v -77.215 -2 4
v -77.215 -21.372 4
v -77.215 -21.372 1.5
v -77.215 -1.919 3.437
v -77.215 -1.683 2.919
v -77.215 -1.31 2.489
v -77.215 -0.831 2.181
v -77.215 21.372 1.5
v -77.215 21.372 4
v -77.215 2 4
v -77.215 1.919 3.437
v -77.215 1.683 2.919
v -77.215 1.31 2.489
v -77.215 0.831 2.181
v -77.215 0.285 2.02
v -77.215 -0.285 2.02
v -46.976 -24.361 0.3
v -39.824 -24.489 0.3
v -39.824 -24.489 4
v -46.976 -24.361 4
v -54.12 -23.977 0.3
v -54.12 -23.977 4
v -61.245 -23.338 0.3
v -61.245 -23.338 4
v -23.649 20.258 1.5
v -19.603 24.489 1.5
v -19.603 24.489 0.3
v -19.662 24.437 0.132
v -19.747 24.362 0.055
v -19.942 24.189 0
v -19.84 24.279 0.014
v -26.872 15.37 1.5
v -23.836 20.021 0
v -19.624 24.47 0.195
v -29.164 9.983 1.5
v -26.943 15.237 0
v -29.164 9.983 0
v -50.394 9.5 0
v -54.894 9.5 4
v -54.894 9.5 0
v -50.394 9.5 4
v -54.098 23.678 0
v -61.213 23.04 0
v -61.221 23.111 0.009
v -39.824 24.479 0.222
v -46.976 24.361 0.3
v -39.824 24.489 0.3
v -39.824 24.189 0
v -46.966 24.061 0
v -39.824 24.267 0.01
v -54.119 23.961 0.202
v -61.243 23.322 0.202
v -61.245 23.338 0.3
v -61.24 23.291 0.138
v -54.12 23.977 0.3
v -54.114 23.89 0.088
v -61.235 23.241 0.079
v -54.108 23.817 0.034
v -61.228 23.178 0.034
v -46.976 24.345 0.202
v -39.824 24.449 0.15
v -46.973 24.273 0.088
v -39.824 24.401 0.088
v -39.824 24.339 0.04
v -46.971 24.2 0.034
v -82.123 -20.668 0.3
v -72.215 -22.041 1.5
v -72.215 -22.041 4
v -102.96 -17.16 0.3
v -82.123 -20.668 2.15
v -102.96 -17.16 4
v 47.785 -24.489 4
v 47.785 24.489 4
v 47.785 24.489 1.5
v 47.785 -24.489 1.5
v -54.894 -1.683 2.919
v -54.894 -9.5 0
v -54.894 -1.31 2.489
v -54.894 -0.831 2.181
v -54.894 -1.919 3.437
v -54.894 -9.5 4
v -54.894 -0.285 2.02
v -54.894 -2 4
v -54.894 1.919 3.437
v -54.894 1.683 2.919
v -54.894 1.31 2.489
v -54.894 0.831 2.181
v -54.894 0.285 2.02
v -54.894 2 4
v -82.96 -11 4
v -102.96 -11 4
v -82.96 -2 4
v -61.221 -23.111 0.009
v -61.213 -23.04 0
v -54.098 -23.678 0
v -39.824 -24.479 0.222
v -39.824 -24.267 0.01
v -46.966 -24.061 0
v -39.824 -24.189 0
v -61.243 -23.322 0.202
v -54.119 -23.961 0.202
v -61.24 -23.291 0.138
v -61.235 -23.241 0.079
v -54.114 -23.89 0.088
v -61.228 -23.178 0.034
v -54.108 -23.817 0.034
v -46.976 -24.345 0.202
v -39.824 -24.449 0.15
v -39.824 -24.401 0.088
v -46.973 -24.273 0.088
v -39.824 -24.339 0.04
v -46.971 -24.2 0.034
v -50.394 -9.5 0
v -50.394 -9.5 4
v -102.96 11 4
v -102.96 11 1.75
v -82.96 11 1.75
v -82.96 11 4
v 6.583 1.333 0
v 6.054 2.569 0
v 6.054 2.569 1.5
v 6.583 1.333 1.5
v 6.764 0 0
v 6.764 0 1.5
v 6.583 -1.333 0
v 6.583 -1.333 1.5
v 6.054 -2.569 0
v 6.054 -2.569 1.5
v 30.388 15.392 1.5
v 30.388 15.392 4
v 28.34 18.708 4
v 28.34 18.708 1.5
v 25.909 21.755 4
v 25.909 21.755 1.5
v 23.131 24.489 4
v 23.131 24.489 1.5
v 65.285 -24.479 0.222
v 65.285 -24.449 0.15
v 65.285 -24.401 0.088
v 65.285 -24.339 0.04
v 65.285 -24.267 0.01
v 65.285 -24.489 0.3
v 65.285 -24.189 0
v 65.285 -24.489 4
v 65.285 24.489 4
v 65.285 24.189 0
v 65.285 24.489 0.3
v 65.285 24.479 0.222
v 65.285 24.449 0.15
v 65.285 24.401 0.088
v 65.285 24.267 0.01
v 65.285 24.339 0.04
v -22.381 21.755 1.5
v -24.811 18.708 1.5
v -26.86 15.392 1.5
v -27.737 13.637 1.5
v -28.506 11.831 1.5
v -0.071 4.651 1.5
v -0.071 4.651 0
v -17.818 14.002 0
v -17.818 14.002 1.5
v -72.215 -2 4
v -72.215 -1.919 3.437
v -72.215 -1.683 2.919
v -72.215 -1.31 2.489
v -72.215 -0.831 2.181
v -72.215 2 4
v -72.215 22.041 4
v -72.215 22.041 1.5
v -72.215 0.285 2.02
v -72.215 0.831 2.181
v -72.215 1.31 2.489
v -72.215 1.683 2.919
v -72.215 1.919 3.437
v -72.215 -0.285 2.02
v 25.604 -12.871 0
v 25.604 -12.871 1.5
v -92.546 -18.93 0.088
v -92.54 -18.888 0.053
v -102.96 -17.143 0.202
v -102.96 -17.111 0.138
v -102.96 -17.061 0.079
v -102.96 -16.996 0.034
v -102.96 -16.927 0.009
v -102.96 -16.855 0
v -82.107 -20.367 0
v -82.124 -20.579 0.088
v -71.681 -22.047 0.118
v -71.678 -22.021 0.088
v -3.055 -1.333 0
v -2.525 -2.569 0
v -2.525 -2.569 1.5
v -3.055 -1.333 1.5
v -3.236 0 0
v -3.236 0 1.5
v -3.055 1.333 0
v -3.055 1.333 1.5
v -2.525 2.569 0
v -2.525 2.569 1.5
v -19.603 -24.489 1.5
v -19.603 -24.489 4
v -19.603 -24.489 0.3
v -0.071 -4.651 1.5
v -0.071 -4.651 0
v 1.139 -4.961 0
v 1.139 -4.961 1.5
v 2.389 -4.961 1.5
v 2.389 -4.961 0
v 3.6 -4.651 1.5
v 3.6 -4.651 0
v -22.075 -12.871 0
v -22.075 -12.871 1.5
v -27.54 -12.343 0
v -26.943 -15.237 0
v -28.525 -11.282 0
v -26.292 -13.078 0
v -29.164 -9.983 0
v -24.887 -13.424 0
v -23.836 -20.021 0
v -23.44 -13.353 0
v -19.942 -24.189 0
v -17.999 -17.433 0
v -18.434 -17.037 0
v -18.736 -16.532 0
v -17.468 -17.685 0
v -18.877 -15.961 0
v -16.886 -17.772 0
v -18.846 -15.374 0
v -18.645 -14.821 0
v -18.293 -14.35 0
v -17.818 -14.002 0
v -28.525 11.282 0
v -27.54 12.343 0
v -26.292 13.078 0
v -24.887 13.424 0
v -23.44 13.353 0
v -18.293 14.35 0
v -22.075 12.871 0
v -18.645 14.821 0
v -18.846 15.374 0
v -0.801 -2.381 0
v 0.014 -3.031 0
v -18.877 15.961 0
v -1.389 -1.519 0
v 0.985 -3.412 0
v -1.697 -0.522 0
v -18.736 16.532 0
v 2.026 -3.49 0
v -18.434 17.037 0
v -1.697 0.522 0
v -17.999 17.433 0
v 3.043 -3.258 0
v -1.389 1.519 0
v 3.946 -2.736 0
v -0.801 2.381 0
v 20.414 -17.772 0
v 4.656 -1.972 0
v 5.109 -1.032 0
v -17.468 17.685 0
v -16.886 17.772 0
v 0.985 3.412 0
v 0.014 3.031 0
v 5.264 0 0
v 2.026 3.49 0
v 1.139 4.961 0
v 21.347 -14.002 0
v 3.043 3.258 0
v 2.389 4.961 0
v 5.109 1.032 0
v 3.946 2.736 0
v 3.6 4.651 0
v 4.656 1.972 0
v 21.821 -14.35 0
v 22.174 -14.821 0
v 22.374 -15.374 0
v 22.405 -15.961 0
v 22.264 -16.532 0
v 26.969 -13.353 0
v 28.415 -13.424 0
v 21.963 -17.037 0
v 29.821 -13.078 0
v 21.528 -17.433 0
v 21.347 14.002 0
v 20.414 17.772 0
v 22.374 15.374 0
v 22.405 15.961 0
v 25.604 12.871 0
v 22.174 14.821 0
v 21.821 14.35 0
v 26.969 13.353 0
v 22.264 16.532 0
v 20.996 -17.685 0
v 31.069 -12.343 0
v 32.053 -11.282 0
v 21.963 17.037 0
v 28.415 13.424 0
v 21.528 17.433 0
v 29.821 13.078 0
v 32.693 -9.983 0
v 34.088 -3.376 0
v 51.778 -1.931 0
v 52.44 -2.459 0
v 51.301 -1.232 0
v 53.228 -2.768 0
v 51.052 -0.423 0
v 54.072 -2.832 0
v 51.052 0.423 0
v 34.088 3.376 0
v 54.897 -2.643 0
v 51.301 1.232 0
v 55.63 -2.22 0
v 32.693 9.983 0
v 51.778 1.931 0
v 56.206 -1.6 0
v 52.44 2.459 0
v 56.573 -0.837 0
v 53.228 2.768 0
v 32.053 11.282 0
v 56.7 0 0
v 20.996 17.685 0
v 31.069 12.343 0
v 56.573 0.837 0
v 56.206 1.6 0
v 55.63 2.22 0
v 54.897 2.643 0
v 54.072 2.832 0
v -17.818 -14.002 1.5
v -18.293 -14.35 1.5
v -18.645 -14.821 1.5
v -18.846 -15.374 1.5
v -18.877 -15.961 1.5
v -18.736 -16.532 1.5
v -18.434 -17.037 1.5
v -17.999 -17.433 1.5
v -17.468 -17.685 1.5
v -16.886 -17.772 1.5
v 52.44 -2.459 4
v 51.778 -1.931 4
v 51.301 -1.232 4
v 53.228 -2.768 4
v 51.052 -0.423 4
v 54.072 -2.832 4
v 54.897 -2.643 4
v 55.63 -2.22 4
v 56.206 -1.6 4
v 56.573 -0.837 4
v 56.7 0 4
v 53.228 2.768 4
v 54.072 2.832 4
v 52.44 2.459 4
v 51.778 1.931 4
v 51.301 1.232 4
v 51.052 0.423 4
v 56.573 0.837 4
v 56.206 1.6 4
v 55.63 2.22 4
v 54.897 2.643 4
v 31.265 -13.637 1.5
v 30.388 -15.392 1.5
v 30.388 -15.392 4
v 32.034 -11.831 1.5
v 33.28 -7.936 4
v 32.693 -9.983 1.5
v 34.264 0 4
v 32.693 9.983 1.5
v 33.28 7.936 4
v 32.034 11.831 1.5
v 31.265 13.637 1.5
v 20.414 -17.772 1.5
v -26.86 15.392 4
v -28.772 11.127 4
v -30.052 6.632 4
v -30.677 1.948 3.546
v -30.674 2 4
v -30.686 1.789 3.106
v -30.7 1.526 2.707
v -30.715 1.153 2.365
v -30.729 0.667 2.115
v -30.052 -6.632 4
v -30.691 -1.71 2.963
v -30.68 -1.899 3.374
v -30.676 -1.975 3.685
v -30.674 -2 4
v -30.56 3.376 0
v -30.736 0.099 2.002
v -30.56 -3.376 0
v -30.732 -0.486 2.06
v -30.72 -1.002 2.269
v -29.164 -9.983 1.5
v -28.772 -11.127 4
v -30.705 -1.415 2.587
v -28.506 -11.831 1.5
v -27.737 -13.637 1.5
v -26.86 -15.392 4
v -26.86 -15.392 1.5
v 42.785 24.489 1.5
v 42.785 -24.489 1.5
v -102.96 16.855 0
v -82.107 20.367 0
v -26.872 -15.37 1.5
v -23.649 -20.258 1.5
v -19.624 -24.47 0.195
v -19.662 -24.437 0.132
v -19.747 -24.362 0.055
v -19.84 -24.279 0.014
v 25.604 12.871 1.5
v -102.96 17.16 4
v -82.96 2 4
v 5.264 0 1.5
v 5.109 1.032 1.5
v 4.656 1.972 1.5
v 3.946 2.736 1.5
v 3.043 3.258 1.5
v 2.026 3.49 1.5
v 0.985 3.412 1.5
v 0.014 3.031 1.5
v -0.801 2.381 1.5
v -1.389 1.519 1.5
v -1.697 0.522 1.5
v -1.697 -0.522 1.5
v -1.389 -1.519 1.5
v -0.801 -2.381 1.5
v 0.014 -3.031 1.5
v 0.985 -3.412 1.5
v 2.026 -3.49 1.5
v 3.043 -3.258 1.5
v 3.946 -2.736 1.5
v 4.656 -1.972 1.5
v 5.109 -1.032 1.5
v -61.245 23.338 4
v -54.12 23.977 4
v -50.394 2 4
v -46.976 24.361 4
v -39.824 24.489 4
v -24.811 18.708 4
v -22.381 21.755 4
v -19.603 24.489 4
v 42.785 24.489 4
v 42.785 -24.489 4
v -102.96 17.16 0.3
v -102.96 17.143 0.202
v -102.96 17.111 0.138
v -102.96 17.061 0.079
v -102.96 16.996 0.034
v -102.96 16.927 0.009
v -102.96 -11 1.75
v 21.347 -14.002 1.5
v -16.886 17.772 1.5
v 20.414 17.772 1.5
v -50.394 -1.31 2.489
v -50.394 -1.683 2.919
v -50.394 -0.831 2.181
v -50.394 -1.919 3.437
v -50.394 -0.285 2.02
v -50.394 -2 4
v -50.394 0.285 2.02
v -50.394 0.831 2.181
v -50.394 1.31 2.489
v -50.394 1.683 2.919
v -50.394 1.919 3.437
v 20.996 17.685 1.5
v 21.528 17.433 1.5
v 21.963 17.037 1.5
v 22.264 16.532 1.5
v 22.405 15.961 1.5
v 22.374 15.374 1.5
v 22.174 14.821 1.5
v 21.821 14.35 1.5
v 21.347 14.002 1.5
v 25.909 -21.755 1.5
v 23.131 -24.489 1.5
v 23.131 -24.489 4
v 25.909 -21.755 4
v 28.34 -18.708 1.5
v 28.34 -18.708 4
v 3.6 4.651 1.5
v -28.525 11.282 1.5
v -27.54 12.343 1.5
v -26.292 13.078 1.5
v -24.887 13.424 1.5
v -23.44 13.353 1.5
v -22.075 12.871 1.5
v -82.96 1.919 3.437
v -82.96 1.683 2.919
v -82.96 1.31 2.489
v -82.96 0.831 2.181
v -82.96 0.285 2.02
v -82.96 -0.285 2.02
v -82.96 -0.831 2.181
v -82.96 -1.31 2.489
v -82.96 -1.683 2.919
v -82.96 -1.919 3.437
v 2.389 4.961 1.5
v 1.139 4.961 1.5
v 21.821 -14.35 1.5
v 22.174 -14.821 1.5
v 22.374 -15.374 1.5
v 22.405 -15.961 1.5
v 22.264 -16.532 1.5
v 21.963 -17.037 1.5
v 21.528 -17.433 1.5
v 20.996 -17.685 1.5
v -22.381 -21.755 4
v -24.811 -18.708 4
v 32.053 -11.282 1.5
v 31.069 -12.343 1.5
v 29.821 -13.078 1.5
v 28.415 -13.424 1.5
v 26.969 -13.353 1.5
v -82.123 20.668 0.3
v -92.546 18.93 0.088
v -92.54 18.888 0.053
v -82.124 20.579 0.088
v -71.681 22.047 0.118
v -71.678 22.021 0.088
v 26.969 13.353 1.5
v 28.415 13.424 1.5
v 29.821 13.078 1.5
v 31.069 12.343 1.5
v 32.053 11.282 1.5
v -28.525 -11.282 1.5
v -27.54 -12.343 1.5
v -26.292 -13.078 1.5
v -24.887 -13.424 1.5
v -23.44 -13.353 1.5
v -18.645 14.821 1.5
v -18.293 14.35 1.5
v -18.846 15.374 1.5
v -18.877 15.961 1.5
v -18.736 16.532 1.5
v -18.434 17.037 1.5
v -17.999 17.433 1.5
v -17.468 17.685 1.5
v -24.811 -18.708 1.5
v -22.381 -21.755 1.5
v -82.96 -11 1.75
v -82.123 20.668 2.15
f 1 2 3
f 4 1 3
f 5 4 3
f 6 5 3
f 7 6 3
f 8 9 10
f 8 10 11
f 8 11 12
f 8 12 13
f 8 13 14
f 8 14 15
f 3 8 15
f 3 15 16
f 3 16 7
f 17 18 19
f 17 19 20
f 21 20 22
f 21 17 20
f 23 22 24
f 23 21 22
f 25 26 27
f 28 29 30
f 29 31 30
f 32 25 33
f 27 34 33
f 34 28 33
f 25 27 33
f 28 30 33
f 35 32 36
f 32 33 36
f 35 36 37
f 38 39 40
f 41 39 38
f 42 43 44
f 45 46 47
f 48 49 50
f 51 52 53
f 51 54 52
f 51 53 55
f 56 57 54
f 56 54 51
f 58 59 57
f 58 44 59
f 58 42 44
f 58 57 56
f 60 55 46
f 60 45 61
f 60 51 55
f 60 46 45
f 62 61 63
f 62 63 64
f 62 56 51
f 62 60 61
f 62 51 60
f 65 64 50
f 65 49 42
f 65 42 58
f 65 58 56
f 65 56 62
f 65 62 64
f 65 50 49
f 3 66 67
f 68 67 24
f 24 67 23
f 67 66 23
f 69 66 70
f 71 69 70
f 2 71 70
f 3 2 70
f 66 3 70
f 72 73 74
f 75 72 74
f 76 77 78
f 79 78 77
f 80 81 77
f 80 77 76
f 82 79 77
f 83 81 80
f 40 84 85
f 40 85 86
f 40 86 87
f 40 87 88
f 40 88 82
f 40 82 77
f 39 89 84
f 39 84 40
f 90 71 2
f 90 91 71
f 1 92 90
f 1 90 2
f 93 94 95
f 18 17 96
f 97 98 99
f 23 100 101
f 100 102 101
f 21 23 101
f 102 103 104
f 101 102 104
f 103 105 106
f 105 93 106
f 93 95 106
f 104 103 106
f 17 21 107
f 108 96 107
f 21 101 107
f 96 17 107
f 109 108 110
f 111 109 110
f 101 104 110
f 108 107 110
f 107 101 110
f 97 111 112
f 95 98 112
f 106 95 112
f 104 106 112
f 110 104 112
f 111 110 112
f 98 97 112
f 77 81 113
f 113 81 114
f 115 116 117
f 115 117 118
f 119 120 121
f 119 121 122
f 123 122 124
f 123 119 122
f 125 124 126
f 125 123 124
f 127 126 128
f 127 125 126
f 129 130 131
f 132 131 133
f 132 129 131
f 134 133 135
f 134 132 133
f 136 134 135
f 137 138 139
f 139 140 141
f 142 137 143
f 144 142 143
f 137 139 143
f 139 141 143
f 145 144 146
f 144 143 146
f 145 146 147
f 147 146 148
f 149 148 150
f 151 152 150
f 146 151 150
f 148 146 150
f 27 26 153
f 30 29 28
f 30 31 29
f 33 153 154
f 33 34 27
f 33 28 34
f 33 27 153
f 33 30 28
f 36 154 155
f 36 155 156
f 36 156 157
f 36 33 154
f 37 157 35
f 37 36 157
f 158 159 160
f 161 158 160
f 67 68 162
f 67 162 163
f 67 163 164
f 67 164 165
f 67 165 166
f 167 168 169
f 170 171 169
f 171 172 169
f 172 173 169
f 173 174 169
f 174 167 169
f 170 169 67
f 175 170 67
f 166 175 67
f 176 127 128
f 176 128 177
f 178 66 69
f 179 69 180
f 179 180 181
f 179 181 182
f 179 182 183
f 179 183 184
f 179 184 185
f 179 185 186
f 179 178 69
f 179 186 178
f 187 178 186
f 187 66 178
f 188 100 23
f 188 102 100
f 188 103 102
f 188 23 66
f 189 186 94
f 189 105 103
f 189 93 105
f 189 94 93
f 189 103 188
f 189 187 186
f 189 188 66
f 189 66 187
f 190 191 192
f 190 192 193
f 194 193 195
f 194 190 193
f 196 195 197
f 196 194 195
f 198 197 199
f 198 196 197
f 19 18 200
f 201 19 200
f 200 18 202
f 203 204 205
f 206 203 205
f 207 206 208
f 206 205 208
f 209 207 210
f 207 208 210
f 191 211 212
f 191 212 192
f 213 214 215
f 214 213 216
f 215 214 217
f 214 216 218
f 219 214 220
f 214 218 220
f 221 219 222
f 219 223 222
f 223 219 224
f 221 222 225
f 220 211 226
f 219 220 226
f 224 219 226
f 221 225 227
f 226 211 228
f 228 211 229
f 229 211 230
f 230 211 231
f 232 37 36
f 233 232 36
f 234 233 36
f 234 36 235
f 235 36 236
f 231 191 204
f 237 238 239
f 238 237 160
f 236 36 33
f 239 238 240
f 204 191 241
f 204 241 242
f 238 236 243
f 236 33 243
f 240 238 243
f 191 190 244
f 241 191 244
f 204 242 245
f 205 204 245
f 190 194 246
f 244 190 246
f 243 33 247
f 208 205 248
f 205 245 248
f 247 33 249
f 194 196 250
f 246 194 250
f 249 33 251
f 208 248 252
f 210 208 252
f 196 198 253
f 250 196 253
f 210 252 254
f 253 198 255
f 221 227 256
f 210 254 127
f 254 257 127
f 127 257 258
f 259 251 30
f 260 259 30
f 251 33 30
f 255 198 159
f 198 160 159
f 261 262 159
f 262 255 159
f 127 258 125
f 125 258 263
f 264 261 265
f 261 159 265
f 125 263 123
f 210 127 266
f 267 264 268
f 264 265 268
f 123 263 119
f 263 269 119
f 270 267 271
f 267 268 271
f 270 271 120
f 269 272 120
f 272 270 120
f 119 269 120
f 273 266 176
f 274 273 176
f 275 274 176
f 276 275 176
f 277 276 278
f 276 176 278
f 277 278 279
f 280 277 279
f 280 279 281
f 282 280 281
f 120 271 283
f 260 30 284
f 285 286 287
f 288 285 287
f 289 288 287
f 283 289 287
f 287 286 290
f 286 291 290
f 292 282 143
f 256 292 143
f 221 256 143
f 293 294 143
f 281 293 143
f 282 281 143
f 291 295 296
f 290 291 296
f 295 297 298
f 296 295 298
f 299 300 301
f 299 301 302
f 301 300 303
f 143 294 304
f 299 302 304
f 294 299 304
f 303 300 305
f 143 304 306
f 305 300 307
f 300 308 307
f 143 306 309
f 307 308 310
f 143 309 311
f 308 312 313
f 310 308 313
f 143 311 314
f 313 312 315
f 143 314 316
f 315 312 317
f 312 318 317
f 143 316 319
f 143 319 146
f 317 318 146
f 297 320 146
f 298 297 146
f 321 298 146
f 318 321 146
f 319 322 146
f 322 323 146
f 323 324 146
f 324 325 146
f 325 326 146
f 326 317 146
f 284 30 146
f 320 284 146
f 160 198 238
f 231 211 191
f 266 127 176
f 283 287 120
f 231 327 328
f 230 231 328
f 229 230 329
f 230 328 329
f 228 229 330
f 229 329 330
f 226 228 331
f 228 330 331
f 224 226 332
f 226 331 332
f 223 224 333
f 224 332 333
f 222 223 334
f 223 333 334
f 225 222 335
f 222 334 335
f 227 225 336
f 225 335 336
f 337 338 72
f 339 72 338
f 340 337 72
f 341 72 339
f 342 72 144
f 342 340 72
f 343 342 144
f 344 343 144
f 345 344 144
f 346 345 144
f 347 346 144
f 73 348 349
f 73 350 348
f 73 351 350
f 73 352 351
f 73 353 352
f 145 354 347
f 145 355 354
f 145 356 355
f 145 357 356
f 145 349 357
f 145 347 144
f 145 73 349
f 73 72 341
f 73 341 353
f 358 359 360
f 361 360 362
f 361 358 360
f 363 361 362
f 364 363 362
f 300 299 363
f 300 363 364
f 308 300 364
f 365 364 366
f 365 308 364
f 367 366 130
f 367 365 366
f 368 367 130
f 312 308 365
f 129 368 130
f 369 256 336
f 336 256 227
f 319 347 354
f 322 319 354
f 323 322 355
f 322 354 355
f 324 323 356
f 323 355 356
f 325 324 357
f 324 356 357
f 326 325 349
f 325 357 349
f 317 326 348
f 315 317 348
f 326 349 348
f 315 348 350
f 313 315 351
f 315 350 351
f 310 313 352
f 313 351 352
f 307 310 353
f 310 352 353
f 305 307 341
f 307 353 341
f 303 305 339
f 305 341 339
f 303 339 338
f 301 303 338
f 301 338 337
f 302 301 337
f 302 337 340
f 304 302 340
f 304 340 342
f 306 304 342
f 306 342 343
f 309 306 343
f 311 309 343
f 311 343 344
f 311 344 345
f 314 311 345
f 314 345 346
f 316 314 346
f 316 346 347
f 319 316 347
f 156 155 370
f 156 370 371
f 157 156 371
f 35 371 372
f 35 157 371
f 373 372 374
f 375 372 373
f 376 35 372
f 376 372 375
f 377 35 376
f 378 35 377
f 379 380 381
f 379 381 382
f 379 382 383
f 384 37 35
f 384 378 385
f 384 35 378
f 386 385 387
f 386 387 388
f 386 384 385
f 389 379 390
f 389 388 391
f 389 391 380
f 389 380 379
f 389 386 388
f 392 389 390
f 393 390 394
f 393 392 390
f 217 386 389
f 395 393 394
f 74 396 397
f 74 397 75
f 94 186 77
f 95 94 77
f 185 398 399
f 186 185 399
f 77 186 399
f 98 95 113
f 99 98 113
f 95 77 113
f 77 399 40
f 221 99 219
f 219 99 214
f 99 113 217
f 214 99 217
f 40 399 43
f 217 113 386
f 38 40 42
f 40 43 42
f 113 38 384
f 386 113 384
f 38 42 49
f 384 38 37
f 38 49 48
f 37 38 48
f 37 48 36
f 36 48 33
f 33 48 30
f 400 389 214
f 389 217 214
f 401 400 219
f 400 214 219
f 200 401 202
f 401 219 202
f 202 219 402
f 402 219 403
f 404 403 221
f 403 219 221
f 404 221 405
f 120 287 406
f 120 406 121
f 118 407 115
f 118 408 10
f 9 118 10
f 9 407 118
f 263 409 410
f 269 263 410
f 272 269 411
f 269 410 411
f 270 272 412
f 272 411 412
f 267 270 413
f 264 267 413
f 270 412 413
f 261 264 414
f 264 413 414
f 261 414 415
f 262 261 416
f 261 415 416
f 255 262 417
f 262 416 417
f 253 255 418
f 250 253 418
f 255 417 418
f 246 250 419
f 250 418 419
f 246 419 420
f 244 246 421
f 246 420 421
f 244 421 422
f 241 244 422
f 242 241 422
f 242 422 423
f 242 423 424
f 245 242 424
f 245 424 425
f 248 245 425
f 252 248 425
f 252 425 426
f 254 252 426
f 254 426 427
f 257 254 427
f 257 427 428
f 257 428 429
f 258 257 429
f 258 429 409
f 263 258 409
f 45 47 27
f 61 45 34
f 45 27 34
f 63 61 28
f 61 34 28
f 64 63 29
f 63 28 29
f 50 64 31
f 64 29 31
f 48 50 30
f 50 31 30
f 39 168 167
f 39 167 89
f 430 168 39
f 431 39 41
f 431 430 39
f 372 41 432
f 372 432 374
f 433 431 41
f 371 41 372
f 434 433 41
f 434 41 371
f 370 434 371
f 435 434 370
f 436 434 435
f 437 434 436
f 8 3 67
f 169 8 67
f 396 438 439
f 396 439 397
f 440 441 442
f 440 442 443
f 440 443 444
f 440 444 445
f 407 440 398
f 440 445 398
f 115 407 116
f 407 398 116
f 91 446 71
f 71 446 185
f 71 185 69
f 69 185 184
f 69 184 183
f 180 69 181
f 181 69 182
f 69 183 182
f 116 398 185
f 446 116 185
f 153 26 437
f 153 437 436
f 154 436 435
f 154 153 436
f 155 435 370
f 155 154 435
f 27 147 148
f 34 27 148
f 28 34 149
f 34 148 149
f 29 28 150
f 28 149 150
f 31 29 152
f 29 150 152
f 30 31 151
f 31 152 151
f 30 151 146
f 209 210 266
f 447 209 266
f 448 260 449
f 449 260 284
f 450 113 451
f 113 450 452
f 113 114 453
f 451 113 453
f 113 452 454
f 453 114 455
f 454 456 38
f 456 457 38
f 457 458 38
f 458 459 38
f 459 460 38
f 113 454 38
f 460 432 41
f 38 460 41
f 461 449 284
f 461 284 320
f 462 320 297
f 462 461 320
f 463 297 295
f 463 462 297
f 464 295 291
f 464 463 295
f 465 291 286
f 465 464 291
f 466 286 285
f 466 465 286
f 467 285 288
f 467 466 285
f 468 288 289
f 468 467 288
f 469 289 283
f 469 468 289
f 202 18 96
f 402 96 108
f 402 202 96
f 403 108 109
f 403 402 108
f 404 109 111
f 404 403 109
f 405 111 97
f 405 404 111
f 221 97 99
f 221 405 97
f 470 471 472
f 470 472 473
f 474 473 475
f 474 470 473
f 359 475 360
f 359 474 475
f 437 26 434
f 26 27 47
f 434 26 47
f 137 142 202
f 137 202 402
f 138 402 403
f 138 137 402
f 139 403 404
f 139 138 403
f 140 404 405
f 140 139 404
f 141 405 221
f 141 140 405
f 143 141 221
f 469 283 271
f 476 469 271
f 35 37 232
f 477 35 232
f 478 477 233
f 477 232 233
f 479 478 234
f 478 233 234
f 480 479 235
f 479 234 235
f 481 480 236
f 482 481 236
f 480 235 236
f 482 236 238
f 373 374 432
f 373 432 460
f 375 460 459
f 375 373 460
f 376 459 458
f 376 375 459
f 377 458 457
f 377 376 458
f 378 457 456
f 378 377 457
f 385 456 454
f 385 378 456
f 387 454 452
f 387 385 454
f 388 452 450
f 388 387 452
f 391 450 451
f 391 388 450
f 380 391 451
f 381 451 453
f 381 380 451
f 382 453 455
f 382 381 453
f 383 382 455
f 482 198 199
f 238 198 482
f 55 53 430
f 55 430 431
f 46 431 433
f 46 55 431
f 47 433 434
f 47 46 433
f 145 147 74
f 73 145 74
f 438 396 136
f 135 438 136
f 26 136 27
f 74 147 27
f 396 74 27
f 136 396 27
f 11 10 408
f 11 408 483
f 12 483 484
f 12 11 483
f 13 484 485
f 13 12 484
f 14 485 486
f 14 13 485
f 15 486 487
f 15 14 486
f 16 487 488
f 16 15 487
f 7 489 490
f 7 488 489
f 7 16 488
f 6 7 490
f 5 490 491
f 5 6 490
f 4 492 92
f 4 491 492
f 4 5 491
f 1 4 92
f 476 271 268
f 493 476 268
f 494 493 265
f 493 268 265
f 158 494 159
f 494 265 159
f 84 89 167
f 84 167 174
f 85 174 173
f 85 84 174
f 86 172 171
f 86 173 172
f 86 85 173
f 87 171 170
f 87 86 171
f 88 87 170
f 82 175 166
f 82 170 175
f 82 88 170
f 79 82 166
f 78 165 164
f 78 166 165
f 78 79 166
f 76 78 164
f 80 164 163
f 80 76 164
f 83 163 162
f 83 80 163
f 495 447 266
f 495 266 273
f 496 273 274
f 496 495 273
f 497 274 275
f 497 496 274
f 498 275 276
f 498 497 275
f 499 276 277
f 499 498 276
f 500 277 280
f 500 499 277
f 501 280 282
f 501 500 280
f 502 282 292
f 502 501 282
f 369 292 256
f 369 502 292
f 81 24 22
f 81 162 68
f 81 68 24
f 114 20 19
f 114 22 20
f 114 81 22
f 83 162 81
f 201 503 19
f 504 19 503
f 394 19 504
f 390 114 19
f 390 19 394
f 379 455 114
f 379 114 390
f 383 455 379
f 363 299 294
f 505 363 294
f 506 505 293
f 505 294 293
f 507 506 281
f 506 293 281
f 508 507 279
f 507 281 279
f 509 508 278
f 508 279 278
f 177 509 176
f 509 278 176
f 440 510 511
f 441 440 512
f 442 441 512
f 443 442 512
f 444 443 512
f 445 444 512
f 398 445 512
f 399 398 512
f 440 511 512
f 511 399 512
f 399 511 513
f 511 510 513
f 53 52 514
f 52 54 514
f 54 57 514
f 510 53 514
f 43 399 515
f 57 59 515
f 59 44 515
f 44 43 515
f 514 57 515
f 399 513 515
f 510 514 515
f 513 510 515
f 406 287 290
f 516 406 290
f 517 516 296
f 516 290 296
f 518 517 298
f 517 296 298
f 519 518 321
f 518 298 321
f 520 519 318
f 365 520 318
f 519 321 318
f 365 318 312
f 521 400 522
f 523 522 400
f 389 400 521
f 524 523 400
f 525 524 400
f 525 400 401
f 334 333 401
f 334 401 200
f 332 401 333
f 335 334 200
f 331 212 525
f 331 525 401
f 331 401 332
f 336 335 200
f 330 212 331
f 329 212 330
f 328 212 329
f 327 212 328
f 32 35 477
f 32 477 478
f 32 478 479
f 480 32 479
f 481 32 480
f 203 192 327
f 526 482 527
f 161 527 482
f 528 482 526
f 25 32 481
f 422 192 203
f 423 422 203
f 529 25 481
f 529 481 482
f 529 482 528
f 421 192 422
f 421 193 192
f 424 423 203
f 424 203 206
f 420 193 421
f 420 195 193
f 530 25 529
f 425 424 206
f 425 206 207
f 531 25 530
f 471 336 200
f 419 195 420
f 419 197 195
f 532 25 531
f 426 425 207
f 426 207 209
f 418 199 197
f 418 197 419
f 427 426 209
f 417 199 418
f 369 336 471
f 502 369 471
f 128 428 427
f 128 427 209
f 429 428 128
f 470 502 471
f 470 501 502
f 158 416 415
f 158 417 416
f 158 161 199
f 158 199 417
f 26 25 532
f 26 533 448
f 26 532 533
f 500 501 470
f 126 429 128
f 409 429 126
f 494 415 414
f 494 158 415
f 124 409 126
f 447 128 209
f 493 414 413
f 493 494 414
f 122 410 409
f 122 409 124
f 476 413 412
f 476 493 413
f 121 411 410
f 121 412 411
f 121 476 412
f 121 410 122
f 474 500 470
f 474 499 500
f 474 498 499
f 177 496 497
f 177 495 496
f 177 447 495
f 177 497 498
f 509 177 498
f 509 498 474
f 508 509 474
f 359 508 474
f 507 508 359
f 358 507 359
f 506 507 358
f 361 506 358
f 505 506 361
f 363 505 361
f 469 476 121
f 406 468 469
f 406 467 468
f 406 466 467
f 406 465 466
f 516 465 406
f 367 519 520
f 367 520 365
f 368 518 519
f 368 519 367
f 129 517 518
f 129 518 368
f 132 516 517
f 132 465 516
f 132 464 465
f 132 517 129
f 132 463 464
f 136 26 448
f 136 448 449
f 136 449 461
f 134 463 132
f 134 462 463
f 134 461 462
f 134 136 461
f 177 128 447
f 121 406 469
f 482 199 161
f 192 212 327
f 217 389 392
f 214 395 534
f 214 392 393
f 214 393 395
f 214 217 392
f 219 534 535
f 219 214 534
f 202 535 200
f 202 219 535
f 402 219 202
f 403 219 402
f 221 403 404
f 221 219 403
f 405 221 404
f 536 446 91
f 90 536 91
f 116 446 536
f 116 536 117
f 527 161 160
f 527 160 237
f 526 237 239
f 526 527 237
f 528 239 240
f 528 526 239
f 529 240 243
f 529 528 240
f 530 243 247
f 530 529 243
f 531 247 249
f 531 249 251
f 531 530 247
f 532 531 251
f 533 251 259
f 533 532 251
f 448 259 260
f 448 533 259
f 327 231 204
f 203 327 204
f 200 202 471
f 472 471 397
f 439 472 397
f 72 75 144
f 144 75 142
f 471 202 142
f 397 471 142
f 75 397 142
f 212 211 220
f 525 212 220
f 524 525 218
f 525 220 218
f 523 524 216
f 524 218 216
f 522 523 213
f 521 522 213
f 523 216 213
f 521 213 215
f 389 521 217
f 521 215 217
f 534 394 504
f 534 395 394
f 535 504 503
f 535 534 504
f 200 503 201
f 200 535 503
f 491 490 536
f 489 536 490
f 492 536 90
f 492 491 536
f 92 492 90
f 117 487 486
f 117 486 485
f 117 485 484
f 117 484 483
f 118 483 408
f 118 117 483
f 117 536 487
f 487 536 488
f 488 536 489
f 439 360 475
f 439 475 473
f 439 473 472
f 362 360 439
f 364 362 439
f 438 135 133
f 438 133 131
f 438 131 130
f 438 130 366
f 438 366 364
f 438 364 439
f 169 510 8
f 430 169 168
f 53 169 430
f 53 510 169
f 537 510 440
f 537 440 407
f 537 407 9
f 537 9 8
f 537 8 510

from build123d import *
from build123d.topology import SkipClean

# Parameters (mm, degrees)
BOSS_EXTRUDE1_DEPTH      = 8
FILLET2_R                = 2
SKETCH3_R                = 2.839661977
CUT_EXTRUDE1_DEPTH       = 8
SKETCH4_R                = 3.5
CUT_EXTRUDE2_DEPTH       = 8
CUT_EXTRUDE3_DEPTH       = 2.5
CUT_EXTRUDE3_DEPTH_BACK  = 2.5
SKETCH5_R                = 32.5
SKETCH6_W                = 4.5
SKETCH6_H                = 19
CUT_EXTRUDE4_DEPTH       = 10
SKETCH7_W                = 5
SKETCH7_H                = 5
CUT_EXTRUDE5_DEPTH       = 51
FILLET3_START            = -1
FILLET3_DEPTH            = 10
FILLET4_START            = -1
FILLET4_DEPTH            = 10
SKETCH9_W                = 5
SKETCH9_H                = 5
CUT_EXTRUDE6_DEPTH       = 51
CUT_EXTRUDE7_DEPTH       = 64
CUT_EXTRUDE7_DEPTH_BACK  = 25
SKETCH10_R               = 2
FILLET5_DEPTH            = 1.5
FILLET5_START            = 6.5
FILLET5_2_DEPTH          = 1.5
CUT_EXTRUDE8_START       = -4
CUT_EXTRUDE8_DEPTH       = 4
FILLET6_R                = 0.3
SKETCH13_W               = 4.5
SKETCH13_H               = 22
CUT_EXTRUDE9_DEPTH       = 20
SURFACE_EXTRUDE2_1_BACK  = 5
SURFACE_EXTRUDE2_1_DEPTH = 5
SURFACE_EXTRUDE2_2_BACK  = 5
SURFACE_EXTRUDE2_2_DEPTH = 5


with BuildPart() as part:
    # Sketch2 → Boss-Extrude1 (new body)
    with BuildSketch(Plane.XY):
        with BuildLine():
            Line((-102.95960155, 17.159933592), (-102.95960155, -17.159933592))
            add(Edge.make_bspline(
                [(-102.95960155, -17.159933592), (-76.189992309, -22.210205625), (-49.286425804, -24.488951052)],
                knots=[0, 0, 0, 0.320704871, 0.320704871, 0.320704871], degree=2))
            Line((-49.286425804, -24.488951052), (65.285160882, -24.488951052))
            Line((65.285160882, -24.488951052), (65.285160882, 24.488951052))
            Line((65.285160882, 24.488951052), (-49.286425804, 24.488951052))
            add(Edge.make_bspline(
                [(-102.95960155, 17.159933592), (-76.189992309, 22.210205625), (-49.286425804, 24.488951052)],
                knots=[0, 0, 0, 0.320704871, 0.320704871, 0.320704871], degree=2))
        make_face()
        with BuildLine():
            Line((-24.971677166, 17.771677006), (28.500163837, 17.771677006))
            Line((28.500163837, 17.771677006), (3.599814154, 4.650879462))
            ThreePointArc((3.599814154, 4.650879462), (1.764243335, 5), (-0.071327484, 4.650879462))
            Line((-0.071327484, 4.650879462), (-24.971677166, 17.771677006))
        make_face(mode=Mode.SUBTRACT)
        with BuildLine():
            Line((3.599814154, -4.650879462), (28.500163837, -17.771677006))
            Line((28.500163837, -17.771677006), (-24.971677166, -17.771677006))
            Line((-24.971677166, -17.771677006), (-0.071327484, -4.650879462))
            ThreePointArc((-0.071327484, -4.650879462), (1.764243335, -5), (3.599814154, -4.650879462))
        make_face(mode=Mode.SUBTRACT)
        with BuildLine():
            Line((-2.525196045, 2.569184657), (-26.859859934, 15.391904107))
            ThreePointArc((-26.859859934, 15.391904107), (-30.735756665, 0), (-26.859859934, -15.391904107))
            Line((-26.859859934, -15.391904107), (-2.525196045, -2.569184657))
            ThreePointArc((-2.525196045, -2.569184657), (-3.235756665, 0), (-2.525196045, 2.569184657))
        make_face(mode=Mode.SUBTRACT)
        with BuildLine():
            Line((6.053682716, -2.569184657), (30.388346604, -15.391904107))
            ThreePointArc((30.388346604, -15.391904107), (34.264243335, 0), (30.388346604, 15.391904107))
            Line((30.388346604, 15.391904107), (6.053682716, 2.569184657))
            ThreePointArc((6.053682716, 2.569184657), (6.764243335, 0), (6.053682716, -2.569184657))
        make_face(mode=Mode.SUBTRACT)
    extrude(amount=BOSS_EXTRUDE1_DEPTH)

    # Fillet2
    fillet2_edges = [part.edges().sort_by_distance(p)[0] for p in [
        (-24.971677166, 17.771677006, 4),
        (28.500163837, 17.771677006, 4),
        (-24.971677166, -17.771677006, 4),
        (28.500163837, -17.771677006, 4),
    ]]
    fillet(fillet2_edges, radius=FILLET2_R)

    # Sketch3 → Cut-Extrude1 (cut)
    with BuildSketch(Plane.XY.offset(8)):
        with Locations((53.859940094, 0)):
            Circle(SKETCH3_R)
    extrude(amount=-CUT_EXTRUDE1_DEPTH, mode=Mode.SUBTRACT)

    # Sketch4 → Cut-Extrude2 (cut)
    with BuildSketch(Plane.XY.offset(8)):
        with Locations((1.764243335, 0)):
            Circle(SKETCH4_R)
    extrude(amount=-CUT_EXTRUDE2_DEPTH, mode=Mode.SUBTRACT)

    # Sketch5 → Cut-Extrude3 (cut, two sides: drawn at the far end of the back side and taken through both)
    with SkipClean():  # the faces are left unmerged after this step: merging them gives an invalid solid
        with BuildSketch(Plane.XY.offset(4).offset(-CUT_EXTRUDE3_DEPTH_BACK)):
            with Locations((1.764243335, 0)):
                Circle(SKETCH5_R)
        extrude(amount=CUT_EXTRUDE3_DEPTH + CUT_EXTRUDE3_DEPTH_BACK, mode=Mode.SUBTRACT)

    # Sketch6 → Cut-Extrude4 (cut)
    with SkipClean():  # the faces are left unmerged after this step: merging them gives an invalid solid
        with BuildSketch(Plane.XY.offset(8)):
            with Locations((-52.644112073, 0)):
                Rectangle(SKETCH6_W, SKETCH6_H)
        extrude(amount=-CUT_EXTRUDE4_DEPTH, mode=Mode.SUBTRACT)

    # Sketch7 → Cut-Extrude5 (cut)
    with SkipClean():  # the faces are left unmerged after this step: merging them gives an invalid solid
        with BuildSketch(Plane(origin=(0, 24.488951052, 0), x_dir=(1, 0, 0), z_dir=(0, 1, 0))):
            with Locations((45.285160882, -4)):
                Rectangle(SKETCH7_W, SKETCH7_H)
        extrude(amount=-CUT_EXTRUDE5_DEPTH, mode=Mode.SUBTRACT)

    # Fillet3: read off the stored shape, not the designer's step
    # Fillet3 outline → Fillet3 (cut)
    with SkipClean():  # the faces are left unmerged after this step: merging them gives an invalid solid
        with BuildSketch(Plane.XY.offset(FILLET3_START)):
            with BuildLine():
                add(Edge.make_bspline(
                    [(-49.286425804, 24.488951052), (-55.269151656, 23.982211205), (-61.245253134, 23.338415518)],
                    knots=[0, 0, 0, 0.071317285, 0.071317285, 0.071317285], degree=2))
                ThreePointArc((-61.245253134, 23.338415518), (-50.549825889, 24.201110037), (-39.823523948, 24.488951052))
                Line((-39.823523948, 24.488951052), (-49.286425804, 24.488951052))
            make_face()
        extrude(amount=FILLET3_DEPTH, mode=Mode.SUBTRACT)

    # Fillet4: read off the stored shape, not the designer's step
    # Fillet4 outline → Fillet4 (cut)
    with SkipClean():  # the faces are left unmerged after this step: merging them gives an invalid solid
        with BuildSketch(Plane.XY.offset(FILLET4_START)):
            with BuildLine():
                Line((-49.286425804, -24.488951052), (-39.823523948, -24.488951052))
                ThreePointArc((-39.823523948, -24.488951052), (-50.549825889, -24.201110037), (-61.245253134, -23.338415518))
                add(Edge.make_bspline(
                    [(-61.245253134, -23.338415518), (-55.269151656, -23.982211205), (-49.286425804, -24.488951052)],
                    knots=[0.249387586, 0.249387586, 0.249387586, 0.320704871, 0.320704871, 0.320704871], degree=2))
            make_face()
        extrude(amount=FILLET4_DEPTH, mode=Mode.SUBTRACT)

    # Sketch9 → Cut-Extrude6 (cut)
    with SkipClean():  # the faces are left unmerged after this step: merging them gives an invalid solid
        with BuildSketch(Plane(origin=(0, 24.488951052, 0), x_dir=(1, 0, 0), z_dir=(0, 1, 0))):
            with Locations((-74.714839118, -4)):
                Rectangle(SKETCH9_W, SKETCH9_H)
        extrude(amount=-CUT_EXTRUDE6_DEPTH, mode=Mode.SUBTRACT)

    # Sketch10 → Cut-Extrude7 (cut, two sides: drawn at the far end of the back side and taken through both)
    with SkipClean():  # the faces are left unmerged after this step: merging them gives an invalid solid
        with BuildSketch(Plane.ZY.offset(50.394112073).offset(-CUT_EXTRUDE7_DEPTH_BACK)):
            with Locations(Location((4, 0, 0), (0, 0, 180))):
                Circle(SKETCH10_R)
        extrude(amount=CUT_EXTRUDE7_DEPTH + CUT_EXTRUDE7_DEPTH_BACK, mode=Mode.SUBTRACT)

    # Fillet5: read off the stored shape, not the designer's step
    # Fillet5 outline → Fillet5 (add)
    with SkipClean():  # the faces are left unmerged after this step: merging them gives an invalid solid
        with BuildSketch(Plane.XY):
            with BuildLine():
                Line((30.388346604, 15.391904107), (25.603831674, 12.87078884))
                ThreePointArc((25.603831674, 12.87078884), (29.820861326, 13.077915151), (32.692963641, 9.983198898))
                ThreePointArc((32.692963641, 9.983198898), (31.663210239, 12.739771507), (30.388346604, 15.391904107))
            make_face()
            with BuildLine():
                ThreePointArc((30.388346604, -15.391904107), (31.663210239, -12.739771507), (32.692963641, -9.983198898))
                ThreePointArc((32.692963641, -9.983198898), (29.820861326, -13.077915151), (25.603831674, -12.87078884))
                Line((25.603831674, -12.87078884), (30.388346604, -15.391904107))
            make_face()
            with BuildLine():
                Line((-26.859859934, -15.391904107), (-22.075345003, -12.87078884))
                ThreePointArc((-22.075345003, -12.87078884), (-26.292374655, -13.077915151), (-29.164476971, -9.983198898))
                ThreePointArc((-29.164476971, -9.983198898), (-28.134723569, -12.739771507), (-26.859859934, -15.391904107))
            make_face()
            with BuildLine():
                ThreePointArc((-26.859859934, 15.391904107), (-28.134723569, 12.739771507), (-29.164476971, 9.983198898))
                ThreePointArc((-29.164476971, 9.983198898), (-26.292374655, 13.077915151), (-22.075345003, 12.87078884))
                Line((-22.075345003, 12.87078884), (-26.859859934, 15.391904107))
            make_face()
        extrude(amount=FILLET5_DEPTH)

    # Fillet5 2 outline → Fillet5 2 (add)
    with SkipClean():  # the faces are left unmerged after this step: merging them gives an invalid solid
        with BuildSketch(Plane.XY.offset(FILLET5_START)):
            with BuildLine():
                Line((30.388346604, 15.391904107), (25.603831674, 12.87078884))
                ThreePointArc((25.603831674, 12.87078884), (29.820861326, 13.077915151), (32.692963641, 9.983198898))
                ThreePointArc((32.692963641, 9.983198898), (31.663210239, 12.739771507), (30.388346604, 15.391904107))
            make_face()
            with BuildLine():
                ThreePointArc((30.388346604, -15.391904107), (31.663210239, -12.739771507), (32.692963641, -9.983198898))
                ThreePointArc((32.692963641, -9.983198898), (29.820861326, -13.077915151), (25.603831674, -12.87078884))
                Line((25.603831674, -12.87078884), (30.388346604, -15.391904107))
            make_face()
            with BuildLine():
                Line((-26.859859934, -15.391904107), (-22.075345003, -12.87078884))
                ThreePointArc((-22.075345003, -12.87078884), (-26.292374655, -13.077915151), (-29.164476971, -9.983198898))
                ThreePointArc((-29.164476971, -9.983198898), (-28.134723569, -12.739771507), (-26.859859934, -15.391904107))
            make_face()
            with BuildLine():
                ThreePointArc((-26.859859934, 15.391904107), (-28.134723569, 12.739771507), (-29.164476971, 9.983198898))
                ThreePointArc((-29.164476971, 9.983198898), (-26.292374655, 13.077915151), (-22.075345003, 12.87078884))
                Line((-22.075345003, 12.87078884), (-26.859859934, 15.391904107))
            make_face()
        extrude(amount=FILLET5_2_DEPTH)


with BuildPart() as body_2:
    # Split1: read off the stored shape, not the designer's step
    # Split1: the piece on the far side of the plane
    add(part.part)
    split(bisect_by=Plane.XY.offset(4), keep=Keep.BOTTOM)

    # Fillet6
    fillet6_edges = [body_2.edges().sort_by_distance(p)[0] for p in [
        (-82.163571081, 20.662100298, 0),
        (-82.163571081, -20.662100298, 0),
        (12.730818467, -24.488951052, 0),
        (12.730818467, 24.488951052, 0),
        (-50.549825889, 24.201110037, 0),
        (-50.549825889, -24.201110037, 0),
    ]]
    fillet(fillet6_edges, radius=FILLET6_R)

    # Sketch13 → Cut-Extrude9 (cut)
    with SkipClean():  # the faces are left unmerged after this step: merging them gives an invalid solid
        with BuildSketch(Plane.ZY.offset(102.95960155)):
            with Locations((4, 0)):
                Rectangle(SKETCH13_W, SKETCH13_H)
        extrude(amount=-CUT_EXTRUDE9_DEPTH, mode=Mode.SUBTRACT)


with BuildPart() as part_1:
    add(part.part)

    # Split1
    split(bisect_by=Plane.XY.offset(4), keep=Keep.TOP)

    # Sketch12 → Cut-Extrude8 (cut)
    with BuildSketch(Plane.XY.offset(8).offset(CUT_EXTRUDE8_START)):
        with BuildLine():
            Line((-39.823523948, -24.488951052), (65.285160882, -24.488951052))
            Line((65.285160882, -24.488951052), (65.285160882, 24.488951052))
            Line((65.285160882, 24.488951052), (-39.823523948, 24.488951052))
            ThreePointArc((-39.823523948, 24.488951052), (-50.549825889, 24.201110037), (-61.245253134, 23.338415518))
            add(Edge.make_bspline(
                [(-61.245253134, 23.338415518), (-82.142929204, 21.087142885), (-102.959601581, 17.159933586)],
                knots=[0, 0, 0, 1, 1, 1], degree=2))
            Line((-102.959601581, 17.159933586), (-102.959601388, -17.159933622))
            add(Edge.make_bspline(
                [(-102.959601388, -17.159933622), (-82.142929109, -21.087142896), (-61.245253139, -23.338415518)],
                knots=[0, 0, 0, 1, 1, 1], degree=2))
            ThreePointArc((-61.245253139, -23.338415518), (-50.549825891, -24.201110037), (-39.823523948, -24.488951052))
        make_face()
    extrude(amount=CUT_EXTRUDE8_DEPTH, mode=Mode.SUBTRACT)


with BuildPart() as body_2_2:
    # Split2: the piece behind the surface
    add(body_2.part)
    # Surface-Extrude2: a surface, the sketch's curves swept straight by 5 mm
    with BuildLine(Plane.XY.offset(1.5).offset(-SURFACE_EXTRUDE2_1_BACK), mode=Mode.PRIVATE) as surface_extrude2_1_path:
        ThreePointArc((-18.386509966, 25.498963535), (-30.729424728, -0.641510544), (-17.364366662, -26.274441565))
    surface_extrude2_1 = Shell.extrude(surface_extrude2_1_path.wire(), (0 * SURFACE_EXTRUDE2_1_DEPTH, 0 * SURFACE_EXTRUDE2_1_DEPTH, 1 * SURFACE_EXTRUDE2_1_DEPTH))
    split(bisect_by=surface_extrude2_1, keep=Keep.BOTTOM)


with BuildPart() as body_2_1:
    add(body_2.part)

    # Split2: split by a surface, the side it looks to stays
    # Surface-Extrude2: a surface, the sketch's curves swept straight by 5 mm
    with BuildLine(Plane.XY.offset(1.5).offset(-SURFACE_EXTRUDE2_2_BACK), mode=Mode.PRIVATE) as surface_extrude2_2_path:
        ThreePointArc((-18.386509966, 25.498963535), (-30.729424728, -0.641510544), (-17.364366662, -26.274441565))
    surface_extrude2_2 = Shell.extrude(surface_extrude2_2_path.wire(), (0 * SURFACE_EXTRUDE2_2_DEPTH, 0 * SURFACE_EXTRUDE2_2_DEPTH, 1 * SURFACE_EXTRUDE2_2_DEPTH))
    split(bisect_by=surface_extrude2_2, keep=Keep.TOP)


solid = Compound([body_2_2.part, body_2_1.part])
